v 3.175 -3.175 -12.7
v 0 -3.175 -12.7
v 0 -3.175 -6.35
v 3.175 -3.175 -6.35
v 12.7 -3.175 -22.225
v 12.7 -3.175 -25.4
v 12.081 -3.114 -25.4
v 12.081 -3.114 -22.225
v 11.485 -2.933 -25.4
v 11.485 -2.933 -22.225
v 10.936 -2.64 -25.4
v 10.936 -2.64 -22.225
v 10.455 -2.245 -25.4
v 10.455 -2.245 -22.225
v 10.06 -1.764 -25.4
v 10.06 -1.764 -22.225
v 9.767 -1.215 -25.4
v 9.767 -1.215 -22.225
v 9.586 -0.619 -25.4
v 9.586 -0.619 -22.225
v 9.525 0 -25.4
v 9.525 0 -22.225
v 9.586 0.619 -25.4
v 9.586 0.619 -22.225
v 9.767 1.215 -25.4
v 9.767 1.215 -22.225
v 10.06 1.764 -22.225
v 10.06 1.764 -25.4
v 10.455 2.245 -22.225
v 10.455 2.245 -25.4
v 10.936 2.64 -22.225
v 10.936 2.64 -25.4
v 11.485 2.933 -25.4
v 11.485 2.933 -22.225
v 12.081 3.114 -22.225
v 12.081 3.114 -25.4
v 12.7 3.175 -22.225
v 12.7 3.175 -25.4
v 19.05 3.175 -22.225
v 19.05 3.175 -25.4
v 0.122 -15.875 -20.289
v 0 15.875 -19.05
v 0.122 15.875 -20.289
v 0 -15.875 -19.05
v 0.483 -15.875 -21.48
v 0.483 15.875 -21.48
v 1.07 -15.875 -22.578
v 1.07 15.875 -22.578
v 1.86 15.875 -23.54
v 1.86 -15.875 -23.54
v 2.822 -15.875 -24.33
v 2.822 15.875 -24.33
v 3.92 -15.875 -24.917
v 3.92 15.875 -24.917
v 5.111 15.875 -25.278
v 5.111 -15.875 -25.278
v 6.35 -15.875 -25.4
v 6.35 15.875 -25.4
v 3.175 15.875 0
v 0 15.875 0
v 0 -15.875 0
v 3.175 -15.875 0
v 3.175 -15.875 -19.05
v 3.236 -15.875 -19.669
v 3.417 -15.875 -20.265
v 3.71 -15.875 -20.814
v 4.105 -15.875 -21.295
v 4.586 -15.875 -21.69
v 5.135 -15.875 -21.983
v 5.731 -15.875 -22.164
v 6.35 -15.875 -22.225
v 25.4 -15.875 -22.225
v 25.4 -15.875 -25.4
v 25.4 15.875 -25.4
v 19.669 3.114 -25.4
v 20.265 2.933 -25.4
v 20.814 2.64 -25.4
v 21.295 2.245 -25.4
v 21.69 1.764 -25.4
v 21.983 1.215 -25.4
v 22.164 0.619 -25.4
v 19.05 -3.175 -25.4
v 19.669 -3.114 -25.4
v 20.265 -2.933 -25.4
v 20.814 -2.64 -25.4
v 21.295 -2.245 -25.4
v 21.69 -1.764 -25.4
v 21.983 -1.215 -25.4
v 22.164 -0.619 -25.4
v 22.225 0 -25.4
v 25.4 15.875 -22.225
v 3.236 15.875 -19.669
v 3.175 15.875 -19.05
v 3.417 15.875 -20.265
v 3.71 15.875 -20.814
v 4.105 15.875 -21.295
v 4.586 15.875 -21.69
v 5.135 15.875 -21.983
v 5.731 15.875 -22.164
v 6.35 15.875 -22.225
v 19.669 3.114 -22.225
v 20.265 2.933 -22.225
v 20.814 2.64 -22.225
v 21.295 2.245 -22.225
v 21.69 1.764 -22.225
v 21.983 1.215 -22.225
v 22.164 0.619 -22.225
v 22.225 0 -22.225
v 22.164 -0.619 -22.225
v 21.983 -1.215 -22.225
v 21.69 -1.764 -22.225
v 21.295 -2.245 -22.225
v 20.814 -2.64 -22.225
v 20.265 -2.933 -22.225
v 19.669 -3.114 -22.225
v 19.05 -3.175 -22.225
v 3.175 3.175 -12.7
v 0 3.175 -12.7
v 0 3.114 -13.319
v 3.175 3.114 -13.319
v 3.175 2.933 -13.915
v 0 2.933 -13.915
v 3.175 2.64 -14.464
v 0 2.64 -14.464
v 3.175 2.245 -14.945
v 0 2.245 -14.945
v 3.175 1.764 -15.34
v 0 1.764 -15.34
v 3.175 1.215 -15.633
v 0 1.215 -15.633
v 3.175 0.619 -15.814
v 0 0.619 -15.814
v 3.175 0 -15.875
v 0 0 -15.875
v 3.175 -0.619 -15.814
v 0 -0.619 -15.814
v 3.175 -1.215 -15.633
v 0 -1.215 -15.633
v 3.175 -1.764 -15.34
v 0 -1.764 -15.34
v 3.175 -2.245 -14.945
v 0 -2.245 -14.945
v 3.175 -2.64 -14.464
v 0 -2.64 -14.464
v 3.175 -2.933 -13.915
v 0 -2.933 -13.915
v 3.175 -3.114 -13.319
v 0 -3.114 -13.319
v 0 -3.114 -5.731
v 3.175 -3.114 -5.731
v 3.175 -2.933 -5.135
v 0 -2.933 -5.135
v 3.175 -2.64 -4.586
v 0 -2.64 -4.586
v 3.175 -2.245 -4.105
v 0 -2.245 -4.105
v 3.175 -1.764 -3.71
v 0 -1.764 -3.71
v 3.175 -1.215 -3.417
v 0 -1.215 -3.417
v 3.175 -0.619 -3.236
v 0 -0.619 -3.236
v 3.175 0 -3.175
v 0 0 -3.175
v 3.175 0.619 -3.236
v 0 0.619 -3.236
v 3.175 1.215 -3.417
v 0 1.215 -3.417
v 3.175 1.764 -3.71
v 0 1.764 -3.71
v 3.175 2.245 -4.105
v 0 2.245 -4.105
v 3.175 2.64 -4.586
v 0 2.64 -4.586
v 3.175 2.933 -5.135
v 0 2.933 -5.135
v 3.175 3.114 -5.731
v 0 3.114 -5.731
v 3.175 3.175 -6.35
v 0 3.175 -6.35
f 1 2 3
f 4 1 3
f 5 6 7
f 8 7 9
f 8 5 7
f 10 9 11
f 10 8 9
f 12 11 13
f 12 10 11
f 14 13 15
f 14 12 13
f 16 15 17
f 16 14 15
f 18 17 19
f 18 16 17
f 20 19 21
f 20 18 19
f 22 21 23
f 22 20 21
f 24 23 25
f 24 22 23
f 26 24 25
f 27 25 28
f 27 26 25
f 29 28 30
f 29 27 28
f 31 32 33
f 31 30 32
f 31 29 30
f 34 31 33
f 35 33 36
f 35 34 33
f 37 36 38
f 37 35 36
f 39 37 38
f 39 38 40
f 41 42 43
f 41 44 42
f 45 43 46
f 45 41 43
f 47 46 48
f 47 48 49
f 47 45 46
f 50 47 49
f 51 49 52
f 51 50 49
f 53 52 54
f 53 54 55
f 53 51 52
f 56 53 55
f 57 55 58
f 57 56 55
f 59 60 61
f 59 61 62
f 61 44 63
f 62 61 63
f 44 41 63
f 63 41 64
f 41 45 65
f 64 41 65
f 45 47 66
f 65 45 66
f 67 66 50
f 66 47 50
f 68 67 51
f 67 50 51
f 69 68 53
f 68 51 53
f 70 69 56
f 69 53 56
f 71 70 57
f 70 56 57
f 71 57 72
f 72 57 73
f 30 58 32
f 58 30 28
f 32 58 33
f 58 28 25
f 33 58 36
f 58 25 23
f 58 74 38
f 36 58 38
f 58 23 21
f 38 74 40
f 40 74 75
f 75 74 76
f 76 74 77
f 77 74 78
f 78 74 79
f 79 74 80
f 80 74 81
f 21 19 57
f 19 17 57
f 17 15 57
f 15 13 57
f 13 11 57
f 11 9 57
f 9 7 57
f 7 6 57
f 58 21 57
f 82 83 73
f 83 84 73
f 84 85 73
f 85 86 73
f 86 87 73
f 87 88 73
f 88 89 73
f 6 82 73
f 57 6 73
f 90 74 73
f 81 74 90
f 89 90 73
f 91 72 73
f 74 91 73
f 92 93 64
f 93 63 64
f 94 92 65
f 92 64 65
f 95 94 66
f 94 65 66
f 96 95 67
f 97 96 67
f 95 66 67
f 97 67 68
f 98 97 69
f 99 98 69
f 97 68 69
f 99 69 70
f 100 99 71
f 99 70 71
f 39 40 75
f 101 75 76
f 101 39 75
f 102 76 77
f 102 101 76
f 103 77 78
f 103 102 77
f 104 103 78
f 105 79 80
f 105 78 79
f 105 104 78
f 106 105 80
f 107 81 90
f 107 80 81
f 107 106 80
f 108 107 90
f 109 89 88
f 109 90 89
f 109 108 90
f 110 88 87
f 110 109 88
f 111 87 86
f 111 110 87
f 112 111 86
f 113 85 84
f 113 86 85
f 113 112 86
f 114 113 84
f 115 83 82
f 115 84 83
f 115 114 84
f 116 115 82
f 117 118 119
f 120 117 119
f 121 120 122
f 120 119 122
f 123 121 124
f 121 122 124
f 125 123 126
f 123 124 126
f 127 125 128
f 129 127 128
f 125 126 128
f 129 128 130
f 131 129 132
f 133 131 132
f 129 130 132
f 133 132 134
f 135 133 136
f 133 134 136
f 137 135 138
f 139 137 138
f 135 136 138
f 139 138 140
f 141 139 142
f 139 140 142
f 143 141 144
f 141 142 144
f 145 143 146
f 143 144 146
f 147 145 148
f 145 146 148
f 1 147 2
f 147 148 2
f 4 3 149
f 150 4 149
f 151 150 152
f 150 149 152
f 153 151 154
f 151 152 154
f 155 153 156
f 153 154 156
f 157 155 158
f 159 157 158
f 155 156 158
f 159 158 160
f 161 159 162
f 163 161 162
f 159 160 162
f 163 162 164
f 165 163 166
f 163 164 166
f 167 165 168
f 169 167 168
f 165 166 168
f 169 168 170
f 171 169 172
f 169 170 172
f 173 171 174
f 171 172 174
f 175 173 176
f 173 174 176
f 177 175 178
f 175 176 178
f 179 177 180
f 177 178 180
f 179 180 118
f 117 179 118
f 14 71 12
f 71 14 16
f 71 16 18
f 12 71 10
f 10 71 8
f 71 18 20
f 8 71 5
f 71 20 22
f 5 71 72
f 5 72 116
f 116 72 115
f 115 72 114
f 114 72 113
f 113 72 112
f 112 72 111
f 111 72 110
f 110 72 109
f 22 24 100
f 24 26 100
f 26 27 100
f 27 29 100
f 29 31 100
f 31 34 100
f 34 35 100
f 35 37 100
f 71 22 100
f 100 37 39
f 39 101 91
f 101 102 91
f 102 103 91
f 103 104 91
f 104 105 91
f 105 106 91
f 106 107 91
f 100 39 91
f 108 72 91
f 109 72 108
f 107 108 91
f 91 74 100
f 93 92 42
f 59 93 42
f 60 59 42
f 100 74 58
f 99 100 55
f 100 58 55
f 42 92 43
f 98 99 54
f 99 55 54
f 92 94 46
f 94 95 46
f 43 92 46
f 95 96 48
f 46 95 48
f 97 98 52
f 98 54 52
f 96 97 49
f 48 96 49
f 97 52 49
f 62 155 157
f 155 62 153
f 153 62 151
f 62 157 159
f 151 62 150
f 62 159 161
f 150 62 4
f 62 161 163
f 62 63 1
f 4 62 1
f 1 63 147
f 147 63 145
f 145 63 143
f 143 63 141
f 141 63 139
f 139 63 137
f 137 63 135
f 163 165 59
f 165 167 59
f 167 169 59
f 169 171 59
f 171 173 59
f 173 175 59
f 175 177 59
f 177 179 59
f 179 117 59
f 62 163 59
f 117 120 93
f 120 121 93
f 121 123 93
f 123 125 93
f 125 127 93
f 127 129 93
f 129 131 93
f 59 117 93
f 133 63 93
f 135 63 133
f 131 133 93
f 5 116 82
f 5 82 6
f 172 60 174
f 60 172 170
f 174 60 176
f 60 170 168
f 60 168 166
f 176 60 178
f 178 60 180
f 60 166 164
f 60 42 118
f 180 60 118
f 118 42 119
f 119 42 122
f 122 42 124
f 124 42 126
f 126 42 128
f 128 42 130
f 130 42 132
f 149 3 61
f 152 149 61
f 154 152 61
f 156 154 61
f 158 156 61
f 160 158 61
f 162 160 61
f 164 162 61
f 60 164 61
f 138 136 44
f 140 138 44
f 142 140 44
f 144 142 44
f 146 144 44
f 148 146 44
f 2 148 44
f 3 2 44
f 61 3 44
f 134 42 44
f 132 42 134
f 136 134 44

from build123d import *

# Parameters (mm, degrees)
SKETCH3_W          = 3.175
SKETCH3_H          = 31.75
FILLET1_R          = 3.175
FILLET2_R          = 6.35
CUT_EXTRUDE2_REACH = 41.273
CUT_EXTRUDE3_DEPTH = 38.297804895


with BuildPart() as part:
    # Sweep1: sweep along a path in Sketch4
    with BuildLine(Plane(origin=(0, 0, 0), x_dir=(1, 0, 0), z_dir=(0, 1, 0))) as sweep1_path:
        Line((0, 0), (0, 25.4))
        Line((0, 25.4), (25.4, 25.4))
    # Sketch3 → Sweep1 (sweep)
    with BuildSketch(Plane.XY):
        with Locations((1.5875, 0)):
            Rectangle(SKETCH3_W, SKETCH3_H)
    sweep(path=sweep1_path.line, transition=Transition.RIGHT)

    # Fillet1
    fillet1_edges = [part.edges().sort_by_distance(p)[0] for p in [
        (3.175, 0, -22.225),
    ]]
    fillet(fillet1_edges, radius=FILLET1_R)

    # Fillet2
    fillet2_edges = [part.edges().sort_by_distance(p)[0] for p in [
        (0, 0, -25.4),
    ]]
    fillet(fillet2_edges, radius=FILLET2_R)

    # Sketch6 → Cut-Extrude2 (cut, up to next)
    with BuildSketch(Plane(origin=(0, 0, 0), x_dir=(0, 0, -1), z_dir=(1, 0, 0)), mode=Mode.PRIVATE) as cut_extrude2_sk1:
        with BuildLine():
            Line((12.7, -3.175), (6.35, -3.175))
            ThreePointArc((6.35, -3.175), (3.175, 0), (6.35, 3.175))
            Line((6.35, 3.175), (12.7, 3.175))
            ThreePointArc((12.7, 3.175), (15.875, 0), (12.7, -3.175))
        make_face()
    cut_extrude2_tool1 = extrude(cut_extrude2_sk1.sketch, amount=CUT_EXTRUDE2_REACH, mode=Mode.PRIVATE) & part.part
    add(cut_extrude2_tool1.solids().sort_by_distance((0, 0, -9.525))[0], mode=Mode.SUBTRACT)

    # Sketch7 → Cut-Extrude3 (cut, through all)
    with BuildSketch(Plane.XY.offset(-22.225)):
        with BuildLine():
            Line((12.7, 3.175), (19.05, 3.175))
            ThreePointArc((19.05, 3.175), (22.225, 0), (19.05, -3.175))
            Line((19.05, -3.175), (12.7, -3.175))
            ThreePointArc((12.7, -3.175), (9.525, 0), (12.7, 3.175))
        make_face()
    extrude(amount=-CUT_EXTRUDE3_DEPTH, mode=Mode.SUBTRACT)


solid = part.part
